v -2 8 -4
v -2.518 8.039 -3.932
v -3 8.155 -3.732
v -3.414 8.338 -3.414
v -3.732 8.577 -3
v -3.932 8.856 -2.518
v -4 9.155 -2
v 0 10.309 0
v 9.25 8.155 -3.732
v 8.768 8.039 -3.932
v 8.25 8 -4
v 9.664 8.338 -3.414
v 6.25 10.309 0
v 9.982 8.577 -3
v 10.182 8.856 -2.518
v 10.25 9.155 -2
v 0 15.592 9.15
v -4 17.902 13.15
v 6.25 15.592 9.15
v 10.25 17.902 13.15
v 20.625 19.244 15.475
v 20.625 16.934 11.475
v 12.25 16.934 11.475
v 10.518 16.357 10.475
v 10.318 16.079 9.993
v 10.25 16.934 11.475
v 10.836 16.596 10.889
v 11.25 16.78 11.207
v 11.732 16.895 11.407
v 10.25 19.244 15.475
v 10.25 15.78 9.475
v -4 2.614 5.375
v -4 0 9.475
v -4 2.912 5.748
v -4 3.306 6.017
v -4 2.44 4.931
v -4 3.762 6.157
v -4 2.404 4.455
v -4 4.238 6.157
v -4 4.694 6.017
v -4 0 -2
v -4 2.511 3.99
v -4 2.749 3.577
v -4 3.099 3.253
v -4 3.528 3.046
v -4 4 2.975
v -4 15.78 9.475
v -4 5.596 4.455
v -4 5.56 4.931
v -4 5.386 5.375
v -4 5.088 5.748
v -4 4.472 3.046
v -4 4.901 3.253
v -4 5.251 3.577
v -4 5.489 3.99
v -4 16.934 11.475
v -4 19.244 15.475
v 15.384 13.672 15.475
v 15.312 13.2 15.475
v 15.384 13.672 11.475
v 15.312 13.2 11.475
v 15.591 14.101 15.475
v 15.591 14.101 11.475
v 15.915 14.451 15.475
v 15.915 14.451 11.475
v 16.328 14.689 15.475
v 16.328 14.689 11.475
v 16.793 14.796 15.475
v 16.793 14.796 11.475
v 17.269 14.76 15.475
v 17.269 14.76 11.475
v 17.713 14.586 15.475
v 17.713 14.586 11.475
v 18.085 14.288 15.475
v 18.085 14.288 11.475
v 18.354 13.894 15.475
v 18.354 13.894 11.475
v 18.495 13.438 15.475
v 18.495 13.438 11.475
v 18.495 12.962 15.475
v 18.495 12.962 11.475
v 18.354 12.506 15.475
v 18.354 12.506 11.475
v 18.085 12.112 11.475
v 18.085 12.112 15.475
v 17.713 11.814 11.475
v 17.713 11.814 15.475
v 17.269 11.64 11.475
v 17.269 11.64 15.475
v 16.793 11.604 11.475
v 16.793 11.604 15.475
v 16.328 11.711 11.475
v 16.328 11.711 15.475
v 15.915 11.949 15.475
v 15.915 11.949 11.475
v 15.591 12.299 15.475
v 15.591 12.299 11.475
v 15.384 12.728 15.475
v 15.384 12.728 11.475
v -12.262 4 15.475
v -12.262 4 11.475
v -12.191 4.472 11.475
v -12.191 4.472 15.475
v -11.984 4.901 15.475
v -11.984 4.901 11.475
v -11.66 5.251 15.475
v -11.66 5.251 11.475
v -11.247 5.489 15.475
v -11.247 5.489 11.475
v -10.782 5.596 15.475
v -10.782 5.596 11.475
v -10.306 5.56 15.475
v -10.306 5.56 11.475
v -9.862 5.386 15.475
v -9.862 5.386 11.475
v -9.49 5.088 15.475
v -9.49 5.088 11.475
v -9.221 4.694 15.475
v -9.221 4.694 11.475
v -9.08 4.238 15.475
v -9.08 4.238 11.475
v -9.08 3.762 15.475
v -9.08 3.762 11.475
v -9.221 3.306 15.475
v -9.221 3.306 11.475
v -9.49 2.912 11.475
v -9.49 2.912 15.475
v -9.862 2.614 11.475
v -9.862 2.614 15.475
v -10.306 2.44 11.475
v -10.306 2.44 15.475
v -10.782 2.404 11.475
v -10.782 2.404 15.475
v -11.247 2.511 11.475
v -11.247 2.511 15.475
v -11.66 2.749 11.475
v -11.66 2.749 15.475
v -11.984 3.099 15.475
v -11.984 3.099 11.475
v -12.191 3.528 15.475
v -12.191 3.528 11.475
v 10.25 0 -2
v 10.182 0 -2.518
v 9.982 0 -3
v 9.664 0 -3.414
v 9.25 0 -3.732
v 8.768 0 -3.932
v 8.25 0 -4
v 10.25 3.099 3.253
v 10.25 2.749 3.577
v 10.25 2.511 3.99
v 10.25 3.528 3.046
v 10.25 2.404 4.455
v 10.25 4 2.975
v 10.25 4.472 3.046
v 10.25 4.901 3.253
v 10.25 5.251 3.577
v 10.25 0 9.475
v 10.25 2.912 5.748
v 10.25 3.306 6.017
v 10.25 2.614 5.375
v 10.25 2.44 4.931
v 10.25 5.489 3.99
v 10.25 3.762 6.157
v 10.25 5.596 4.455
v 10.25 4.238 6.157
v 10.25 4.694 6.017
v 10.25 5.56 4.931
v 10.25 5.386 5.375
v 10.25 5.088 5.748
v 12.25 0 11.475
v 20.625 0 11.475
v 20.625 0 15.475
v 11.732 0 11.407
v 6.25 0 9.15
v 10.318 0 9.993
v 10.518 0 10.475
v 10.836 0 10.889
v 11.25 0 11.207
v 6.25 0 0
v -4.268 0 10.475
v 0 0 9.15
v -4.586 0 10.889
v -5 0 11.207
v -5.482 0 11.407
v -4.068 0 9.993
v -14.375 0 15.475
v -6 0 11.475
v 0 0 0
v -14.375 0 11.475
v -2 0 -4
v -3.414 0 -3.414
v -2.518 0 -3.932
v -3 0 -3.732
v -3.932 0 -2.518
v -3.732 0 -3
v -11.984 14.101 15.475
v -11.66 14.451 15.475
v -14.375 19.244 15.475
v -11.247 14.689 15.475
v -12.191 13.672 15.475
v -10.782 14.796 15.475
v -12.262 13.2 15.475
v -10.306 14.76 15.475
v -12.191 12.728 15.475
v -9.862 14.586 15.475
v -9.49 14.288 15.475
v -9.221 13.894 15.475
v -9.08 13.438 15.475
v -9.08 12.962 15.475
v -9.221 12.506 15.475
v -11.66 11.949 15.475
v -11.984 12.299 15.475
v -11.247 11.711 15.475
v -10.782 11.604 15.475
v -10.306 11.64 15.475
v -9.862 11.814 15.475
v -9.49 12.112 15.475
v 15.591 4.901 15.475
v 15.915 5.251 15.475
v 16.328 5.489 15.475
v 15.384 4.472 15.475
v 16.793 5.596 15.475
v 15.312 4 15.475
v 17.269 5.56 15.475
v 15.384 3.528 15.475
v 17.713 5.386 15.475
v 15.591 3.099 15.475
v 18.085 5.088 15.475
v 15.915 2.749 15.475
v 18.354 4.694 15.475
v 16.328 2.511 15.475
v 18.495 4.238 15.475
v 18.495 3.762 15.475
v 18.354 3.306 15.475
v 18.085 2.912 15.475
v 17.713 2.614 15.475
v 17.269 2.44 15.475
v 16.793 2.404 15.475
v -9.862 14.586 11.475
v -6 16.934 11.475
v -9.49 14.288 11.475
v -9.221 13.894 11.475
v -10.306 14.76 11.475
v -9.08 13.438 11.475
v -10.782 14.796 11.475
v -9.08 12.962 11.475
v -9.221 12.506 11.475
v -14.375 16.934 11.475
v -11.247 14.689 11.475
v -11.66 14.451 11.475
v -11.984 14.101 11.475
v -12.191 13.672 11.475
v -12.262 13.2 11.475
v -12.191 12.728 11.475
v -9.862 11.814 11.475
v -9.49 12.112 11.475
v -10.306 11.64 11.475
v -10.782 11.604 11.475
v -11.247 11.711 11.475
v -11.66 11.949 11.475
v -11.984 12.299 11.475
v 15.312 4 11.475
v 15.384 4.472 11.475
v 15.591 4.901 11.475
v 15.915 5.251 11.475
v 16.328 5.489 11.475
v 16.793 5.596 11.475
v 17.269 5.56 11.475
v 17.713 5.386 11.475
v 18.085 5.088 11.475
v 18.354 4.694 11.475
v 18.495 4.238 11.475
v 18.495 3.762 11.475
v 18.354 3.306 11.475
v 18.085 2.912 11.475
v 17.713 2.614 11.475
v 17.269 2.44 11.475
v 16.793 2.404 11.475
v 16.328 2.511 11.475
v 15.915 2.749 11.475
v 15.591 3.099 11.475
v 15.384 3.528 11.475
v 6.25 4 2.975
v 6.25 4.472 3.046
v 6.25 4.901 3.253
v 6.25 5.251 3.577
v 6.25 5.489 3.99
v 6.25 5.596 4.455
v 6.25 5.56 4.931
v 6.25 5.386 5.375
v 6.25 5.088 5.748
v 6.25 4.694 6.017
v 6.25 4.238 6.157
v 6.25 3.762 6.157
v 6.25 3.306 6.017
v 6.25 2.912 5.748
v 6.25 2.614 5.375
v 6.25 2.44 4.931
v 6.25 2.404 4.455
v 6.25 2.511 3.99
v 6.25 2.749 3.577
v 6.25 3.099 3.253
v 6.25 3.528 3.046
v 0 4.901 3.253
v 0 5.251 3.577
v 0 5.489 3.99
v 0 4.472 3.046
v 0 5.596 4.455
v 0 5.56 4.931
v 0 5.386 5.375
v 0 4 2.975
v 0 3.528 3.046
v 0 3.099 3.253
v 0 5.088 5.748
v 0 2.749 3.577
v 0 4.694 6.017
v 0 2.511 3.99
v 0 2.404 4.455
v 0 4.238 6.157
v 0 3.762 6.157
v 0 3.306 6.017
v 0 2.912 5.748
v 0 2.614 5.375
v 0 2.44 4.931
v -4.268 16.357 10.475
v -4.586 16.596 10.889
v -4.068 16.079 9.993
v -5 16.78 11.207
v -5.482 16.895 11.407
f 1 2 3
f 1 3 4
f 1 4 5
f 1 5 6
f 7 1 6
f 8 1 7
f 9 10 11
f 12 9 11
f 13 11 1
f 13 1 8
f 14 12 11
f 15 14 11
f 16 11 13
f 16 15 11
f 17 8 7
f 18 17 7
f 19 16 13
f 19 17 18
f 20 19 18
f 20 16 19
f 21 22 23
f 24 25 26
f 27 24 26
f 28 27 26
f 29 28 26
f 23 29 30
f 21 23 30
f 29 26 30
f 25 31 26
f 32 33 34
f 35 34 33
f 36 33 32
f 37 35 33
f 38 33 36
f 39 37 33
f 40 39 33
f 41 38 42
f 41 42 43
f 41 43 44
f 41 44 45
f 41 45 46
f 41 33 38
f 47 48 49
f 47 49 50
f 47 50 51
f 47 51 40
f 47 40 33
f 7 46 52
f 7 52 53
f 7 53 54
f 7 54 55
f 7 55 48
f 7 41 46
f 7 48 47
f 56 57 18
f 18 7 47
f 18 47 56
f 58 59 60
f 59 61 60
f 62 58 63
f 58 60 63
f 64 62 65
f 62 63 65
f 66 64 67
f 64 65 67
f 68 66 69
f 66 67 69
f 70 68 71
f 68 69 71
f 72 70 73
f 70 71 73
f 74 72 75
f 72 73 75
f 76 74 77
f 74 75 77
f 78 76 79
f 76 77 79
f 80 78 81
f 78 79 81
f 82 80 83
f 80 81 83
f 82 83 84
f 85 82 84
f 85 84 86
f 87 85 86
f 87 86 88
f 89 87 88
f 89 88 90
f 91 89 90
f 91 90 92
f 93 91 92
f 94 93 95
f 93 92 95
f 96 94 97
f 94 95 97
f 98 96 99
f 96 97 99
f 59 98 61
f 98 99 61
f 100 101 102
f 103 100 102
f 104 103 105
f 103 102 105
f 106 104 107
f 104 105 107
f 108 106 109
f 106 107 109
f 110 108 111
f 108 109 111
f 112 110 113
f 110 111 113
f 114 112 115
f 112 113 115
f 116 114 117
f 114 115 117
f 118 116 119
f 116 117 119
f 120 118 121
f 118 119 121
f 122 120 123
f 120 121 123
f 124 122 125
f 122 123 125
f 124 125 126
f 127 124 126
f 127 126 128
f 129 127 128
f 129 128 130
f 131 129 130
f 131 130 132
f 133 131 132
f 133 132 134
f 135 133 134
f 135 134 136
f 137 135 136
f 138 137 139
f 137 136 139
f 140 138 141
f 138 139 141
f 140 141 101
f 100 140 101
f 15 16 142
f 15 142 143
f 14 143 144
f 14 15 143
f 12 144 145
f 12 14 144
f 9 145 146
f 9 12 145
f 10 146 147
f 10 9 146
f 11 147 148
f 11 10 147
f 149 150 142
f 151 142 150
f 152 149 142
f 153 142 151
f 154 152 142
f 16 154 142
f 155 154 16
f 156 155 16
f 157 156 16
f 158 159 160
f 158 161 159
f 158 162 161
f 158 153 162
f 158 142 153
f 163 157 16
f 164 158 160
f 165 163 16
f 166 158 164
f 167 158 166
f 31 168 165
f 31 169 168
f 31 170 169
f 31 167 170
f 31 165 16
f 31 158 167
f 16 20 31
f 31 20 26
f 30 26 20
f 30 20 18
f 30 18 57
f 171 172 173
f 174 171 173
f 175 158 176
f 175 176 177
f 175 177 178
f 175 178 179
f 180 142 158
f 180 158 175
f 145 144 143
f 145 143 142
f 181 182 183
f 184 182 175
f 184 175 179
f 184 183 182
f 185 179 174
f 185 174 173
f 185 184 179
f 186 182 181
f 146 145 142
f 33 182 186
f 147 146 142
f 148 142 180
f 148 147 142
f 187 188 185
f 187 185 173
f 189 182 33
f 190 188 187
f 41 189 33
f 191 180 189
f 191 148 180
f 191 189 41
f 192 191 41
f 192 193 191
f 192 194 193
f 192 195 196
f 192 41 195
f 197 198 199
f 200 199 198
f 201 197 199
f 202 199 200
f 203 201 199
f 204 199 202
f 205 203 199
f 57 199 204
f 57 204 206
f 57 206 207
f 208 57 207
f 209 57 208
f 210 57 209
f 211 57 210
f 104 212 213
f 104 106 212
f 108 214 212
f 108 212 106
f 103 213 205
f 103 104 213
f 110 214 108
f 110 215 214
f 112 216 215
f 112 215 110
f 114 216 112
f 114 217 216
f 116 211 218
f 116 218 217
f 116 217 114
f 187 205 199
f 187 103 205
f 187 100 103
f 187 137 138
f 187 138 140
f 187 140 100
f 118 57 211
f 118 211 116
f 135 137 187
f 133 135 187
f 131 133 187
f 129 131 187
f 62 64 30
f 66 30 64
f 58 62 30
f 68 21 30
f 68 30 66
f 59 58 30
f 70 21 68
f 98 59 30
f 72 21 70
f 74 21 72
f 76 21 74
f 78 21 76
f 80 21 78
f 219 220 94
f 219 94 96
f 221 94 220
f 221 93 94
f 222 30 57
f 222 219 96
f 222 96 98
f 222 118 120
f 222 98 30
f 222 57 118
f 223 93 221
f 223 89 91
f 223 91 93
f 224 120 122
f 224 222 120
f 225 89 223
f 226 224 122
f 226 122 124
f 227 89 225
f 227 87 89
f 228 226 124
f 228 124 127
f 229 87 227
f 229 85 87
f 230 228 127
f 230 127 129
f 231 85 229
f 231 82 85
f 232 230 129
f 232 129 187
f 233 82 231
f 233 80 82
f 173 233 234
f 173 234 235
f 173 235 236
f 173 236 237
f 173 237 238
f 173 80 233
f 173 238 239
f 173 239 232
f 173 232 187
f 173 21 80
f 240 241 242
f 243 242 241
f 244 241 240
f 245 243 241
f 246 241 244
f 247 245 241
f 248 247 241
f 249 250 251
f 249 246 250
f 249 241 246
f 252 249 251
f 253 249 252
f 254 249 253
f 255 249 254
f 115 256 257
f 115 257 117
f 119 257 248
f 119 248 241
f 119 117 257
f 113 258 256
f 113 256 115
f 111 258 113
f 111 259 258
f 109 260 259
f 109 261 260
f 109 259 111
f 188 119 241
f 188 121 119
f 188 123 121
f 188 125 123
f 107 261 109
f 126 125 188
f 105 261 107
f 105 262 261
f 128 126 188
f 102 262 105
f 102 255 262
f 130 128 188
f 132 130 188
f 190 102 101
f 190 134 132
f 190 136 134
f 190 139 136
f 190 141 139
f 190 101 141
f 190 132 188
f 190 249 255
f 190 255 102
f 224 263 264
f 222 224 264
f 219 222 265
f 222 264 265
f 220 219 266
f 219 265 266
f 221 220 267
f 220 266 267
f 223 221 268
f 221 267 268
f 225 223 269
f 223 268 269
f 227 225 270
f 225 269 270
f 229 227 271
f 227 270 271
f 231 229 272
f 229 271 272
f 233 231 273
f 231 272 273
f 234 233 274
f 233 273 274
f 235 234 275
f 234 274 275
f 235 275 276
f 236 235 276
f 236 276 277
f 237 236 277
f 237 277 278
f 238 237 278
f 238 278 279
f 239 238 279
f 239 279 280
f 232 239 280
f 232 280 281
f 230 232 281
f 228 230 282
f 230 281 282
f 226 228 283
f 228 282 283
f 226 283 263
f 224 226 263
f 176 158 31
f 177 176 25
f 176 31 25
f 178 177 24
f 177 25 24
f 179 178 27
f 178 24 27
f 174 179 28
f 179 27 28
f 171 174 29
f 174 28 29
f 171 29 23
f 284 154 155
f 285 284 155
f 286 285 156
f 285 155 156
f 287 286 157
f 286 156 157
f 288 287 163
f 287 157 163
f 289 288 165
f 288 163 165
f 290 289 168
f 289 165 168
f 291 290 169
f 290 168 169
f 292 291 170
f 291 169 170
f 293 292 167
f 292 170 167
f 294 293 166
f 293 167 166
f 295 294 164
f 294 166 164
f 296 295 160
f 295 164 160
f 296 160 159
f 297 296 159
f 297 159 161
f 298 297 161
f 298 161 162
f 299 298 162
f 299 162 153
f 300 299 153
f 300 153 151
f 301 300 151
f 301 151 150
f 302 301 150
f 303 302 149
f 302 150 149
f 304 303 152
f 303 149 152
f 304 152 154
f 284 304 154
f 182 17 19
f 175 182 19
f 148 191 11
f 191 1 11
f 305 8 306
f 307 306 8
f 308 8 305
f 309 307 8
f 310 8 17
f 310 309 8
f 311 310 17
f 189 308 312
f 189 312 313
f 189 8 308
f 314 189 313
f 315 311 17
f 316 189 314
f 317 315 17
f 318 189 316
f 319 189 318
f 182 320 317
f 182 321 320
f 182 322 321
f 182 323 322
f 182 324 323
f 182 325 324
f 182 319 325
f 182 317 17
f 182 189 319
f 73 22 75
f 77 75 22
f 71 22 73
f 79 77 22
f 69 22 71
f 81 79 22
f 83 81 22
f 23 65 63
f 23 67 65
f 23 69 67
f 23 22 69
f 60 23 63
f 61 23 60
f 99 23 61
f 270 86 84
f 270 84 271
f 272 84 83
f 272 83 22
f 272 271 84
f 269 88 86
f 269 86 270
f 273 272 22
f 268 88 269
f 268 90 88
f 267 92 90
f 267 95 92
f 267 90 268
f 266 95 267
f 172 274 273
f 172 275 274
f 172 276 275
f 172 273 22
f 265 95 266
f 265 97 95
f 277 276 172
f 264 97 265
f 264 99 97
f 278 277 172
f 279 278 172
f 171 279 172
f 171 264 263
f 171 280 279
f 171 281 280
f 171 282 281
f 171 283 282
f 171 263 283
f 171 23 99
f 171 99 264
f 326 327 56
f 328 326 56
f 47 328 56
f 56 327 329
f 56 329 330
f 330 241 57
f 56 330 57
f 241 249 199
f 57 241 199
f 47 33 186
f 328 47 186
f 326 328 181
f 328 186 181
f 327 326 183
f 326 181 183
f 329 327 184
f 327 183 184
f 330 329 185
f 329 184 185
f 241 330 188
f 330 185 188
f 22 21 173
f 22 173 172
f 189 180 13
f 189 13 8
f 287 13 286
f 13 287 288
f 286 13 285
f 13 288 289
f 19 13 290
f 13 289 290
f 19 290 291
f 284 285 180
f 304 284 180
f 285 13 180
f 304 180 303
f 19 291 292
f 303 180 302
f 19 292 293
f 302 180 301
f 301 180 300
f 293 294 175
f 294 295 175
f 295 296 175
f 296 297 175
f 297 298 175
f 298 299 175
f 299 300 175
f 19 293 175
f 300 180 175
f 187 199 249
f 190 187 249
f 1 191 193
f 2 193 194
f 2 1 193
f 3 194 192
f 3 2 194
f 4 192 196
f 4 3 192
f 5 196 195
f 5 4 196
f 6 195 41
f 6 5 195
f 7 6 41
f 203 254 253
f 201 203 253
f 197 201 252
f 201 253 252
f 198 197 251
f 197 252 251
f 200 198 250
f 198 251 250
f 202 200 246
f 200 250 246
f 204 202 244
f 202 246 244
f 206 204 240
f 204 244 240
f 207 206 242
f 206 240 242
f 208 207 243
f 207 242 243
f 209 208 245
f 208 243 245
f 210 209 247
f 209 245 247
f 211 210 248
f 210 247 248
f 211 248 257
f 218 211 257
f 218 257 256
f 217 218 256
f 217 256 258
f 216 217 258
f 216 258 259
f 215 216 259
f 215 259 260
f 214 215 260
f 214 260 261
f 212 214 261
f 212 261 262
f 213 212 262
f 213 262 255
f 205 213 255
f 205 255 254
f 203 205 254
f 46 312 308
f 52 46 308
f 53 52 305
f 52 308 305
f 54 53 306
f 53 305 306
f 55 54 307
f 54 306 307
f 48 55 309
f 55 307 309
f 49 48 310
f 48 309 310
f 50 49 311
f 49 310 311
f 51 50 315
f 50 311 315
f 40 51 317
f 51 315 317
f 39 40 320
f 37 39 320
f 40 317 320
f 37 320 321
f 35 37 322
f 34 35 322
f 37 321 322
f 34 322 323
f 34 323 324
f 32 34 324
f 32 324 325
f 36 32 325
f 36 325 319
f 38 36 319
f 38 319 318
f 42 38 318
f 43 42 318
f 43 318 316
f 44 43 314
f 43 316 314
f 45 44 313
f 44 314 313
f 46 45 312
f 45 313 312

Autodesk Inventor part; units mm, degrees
ref_plane "YZ Plane" through (0, 0, 0) normal (1, 0, 0) x (0, 1, 0)
ref_plane "XZ Plane" through (0, 0, 0) normal (0, 1, 0) x (-1, 0, 0)
ref_plane "XY Plane" through (0, 0, 0) normal (0, 0, 1) x (1, 0, 0)
sketch "Sketch1" plane through (0, 0, 0) normal (0, 0, 1) x (1, 0, 0)
  line L0 (0, 0) -> (6.25, 0)
  line L1 (6.25, 0) -> (6.25, 8)
  line L2 (6.25, 8) -> (0, 8)
  line L3 (0, 8) -> (0, 0)
  line L4 (6.25, 0) -> (10.25, 0)
  line L5 (10.25, 0) -> (10.25, 8)
  line L6 (10.25, 8) -> (6.25, 8)
  line L7 (6.25, 8) -> (6.25, 0)
  line L8 (0, 0) -> (-4, 0)
  line L9 (-4, 0) -> (-4, 8)
  line L10 (-4, 8) -> (0, 8)
  line L11 (0, 8) -> (0, 0)
  point P0 (6.25, 4)
  point P1 (3.125, 8)
  dimension "d0" = 6.25
  dimension "d1" = 8
  dimension "d3" = 4
extrude "Extrusion1" add sketch "Sketch1" along normal blind 9.15 contours L8 L9 L10 L3 | L1 L6 L5 L4
extrude "Extrusion2" add sketch "Sketch1" against normal blind 4
sketch "Sketch2" plane through (10.25, 0, 9.15) normal (1, 0, 0) x (0, 0, -1)
  line L0 (9.15, 0) -> (9.15, 8) projected
  line L1 (9.15, 8) -> (0, 8) projected
  line L2 (0, 0) -> (0, 8) projected
  line L3 (9.15, 0) -> (0, 0) projected
  circle A0 centre (4.575, 4) radius 1.6
  line L4 (0, 0) -> (0, 8) projected
  point P0 (0, 4)
  point P1 (4.575, 8)
  dimension "d8" = 3.2
extrude "Extrusion3" cut sketch "Sketch2" against normal through all contours A0
extrude "Extrusion4" add sketch "Sketch1" along normal blind 4 from surface at 9.15
sketch "Sketch3" plane through (10.25, 0, -4) normal (1, 0, 0) x (0, 0, -1)
  line L0 (-17.15, 17.9016) -> (-17.15, -9.9016)
  line L1 (-17.15, -9.9016) -> (0, 0)
  line L2 (0, 0) -> (0, 8)
  line L3 (0, 8) -> (-17.15, 17.9016)
  line L4 (-17.15, 8) -> (-17.15, 0) projected
  circle A0 centre (-8.575, 4) radius 1.6 projected
  line L5 (0, 0) -> (-17.15, 0) projected
  line L6 (-19.475, 19.2439) -> (-19.475, -11.2439)
  line L7 (-17.15, 17.9016) -> (-19.475, 19.2439)
  line L8 (-19.475, -11.2439) -> (-17.15, -9.9016)
  line L9 (-17.15, 0) -> (-19.475, 0)
  point P0 (-4, 0)
  dimension "d13" = 60
  dimension "d20" = 2.325
sketch "Sketch4" plane through (-4, 8, -4) normal (0, 1, 0) x (1, 0, 0)
  line L0 (4, -13.15) -> (10.25, -13.15) projected
  line L1 (10.25, -4) -> (10.25, -13.15) projected
  line L2 (4, -4) -> (4, -13.15) projected
  line L3 (10.25, -4) -> (4, -4) projected
extrude "Extrusion5" add sketch "Sketch3" against normal up to surface (14.25 mm away) contours L3 L2 L5 L0 | L0 L9 L6 L7
extrude "Extrusion6" cut sketch "Sketch4" along normal through all both and the other way through all
sketch "Sketch5" plane through (10.25, 0, 15.475) normal (1, 0, 0) x (0, 0, -1)
  circle A0 centre (10.9, 4) radius 1.6 projected
  line L0 (19.475, 8) -> (0, 19.2439) projected
  line L1 (0, 19.2439) -> (0, 0) projected
  line L2 (19.475, 0) -> (0, 0) projected
  line L3 (19.475, 8) -> (19.475, 0) projected
  line L4 (4, 16.9345) -> (4, 0)
  point P0 (15.475, 0)
  dimension "d21" = 4
extrude "Extrusion7" add sketch "Sketch5" along normal blind 10.375 and the other way blind 24.625 contours L4 L2 L1 L0
sketch "Sketch6" plane through (10.25, 0, 11.475) normal (0, 0, -1) x (-1, 0, 0)
  circle A0 centre (-6.6625, 13.2) radius 1.6
  line L0 (-10.375, 0) -> (-10.375, 16.9345) projected
  line L1 (0, 16.9345) -> (-10.375, 16.9345) projected
  circle A1 centre (20.9125, 13.2) radius 1.6
  circle A2 centre (20.9125, 4) radius 1.6
  circle A3 centre (-6.6625, 4) radius 1.6
  line L2 (0, 0) -> (-10.375, 0) projected
  line L3 (24.625, 16.9345) -> (24.625, 0) projected
  point P0 (10.25, 0)
  dimension "d26" = 3.2
  dimension "d27" = 3.7125
  dimension "d29" = 4
  dimension "d30" = 3.7125
  dimension "d34" = 6
extrude "Extrusion8" cut sketch "Sketch6" against normal through all
fillet "Fillet1" radius 2 4 edges at (10.25, 8.4672, 11.475) (-4, 8.4672, 11.475) (10.25, 4, -4) (-4, 4, -4)
properties part number "TopMotorMount"
